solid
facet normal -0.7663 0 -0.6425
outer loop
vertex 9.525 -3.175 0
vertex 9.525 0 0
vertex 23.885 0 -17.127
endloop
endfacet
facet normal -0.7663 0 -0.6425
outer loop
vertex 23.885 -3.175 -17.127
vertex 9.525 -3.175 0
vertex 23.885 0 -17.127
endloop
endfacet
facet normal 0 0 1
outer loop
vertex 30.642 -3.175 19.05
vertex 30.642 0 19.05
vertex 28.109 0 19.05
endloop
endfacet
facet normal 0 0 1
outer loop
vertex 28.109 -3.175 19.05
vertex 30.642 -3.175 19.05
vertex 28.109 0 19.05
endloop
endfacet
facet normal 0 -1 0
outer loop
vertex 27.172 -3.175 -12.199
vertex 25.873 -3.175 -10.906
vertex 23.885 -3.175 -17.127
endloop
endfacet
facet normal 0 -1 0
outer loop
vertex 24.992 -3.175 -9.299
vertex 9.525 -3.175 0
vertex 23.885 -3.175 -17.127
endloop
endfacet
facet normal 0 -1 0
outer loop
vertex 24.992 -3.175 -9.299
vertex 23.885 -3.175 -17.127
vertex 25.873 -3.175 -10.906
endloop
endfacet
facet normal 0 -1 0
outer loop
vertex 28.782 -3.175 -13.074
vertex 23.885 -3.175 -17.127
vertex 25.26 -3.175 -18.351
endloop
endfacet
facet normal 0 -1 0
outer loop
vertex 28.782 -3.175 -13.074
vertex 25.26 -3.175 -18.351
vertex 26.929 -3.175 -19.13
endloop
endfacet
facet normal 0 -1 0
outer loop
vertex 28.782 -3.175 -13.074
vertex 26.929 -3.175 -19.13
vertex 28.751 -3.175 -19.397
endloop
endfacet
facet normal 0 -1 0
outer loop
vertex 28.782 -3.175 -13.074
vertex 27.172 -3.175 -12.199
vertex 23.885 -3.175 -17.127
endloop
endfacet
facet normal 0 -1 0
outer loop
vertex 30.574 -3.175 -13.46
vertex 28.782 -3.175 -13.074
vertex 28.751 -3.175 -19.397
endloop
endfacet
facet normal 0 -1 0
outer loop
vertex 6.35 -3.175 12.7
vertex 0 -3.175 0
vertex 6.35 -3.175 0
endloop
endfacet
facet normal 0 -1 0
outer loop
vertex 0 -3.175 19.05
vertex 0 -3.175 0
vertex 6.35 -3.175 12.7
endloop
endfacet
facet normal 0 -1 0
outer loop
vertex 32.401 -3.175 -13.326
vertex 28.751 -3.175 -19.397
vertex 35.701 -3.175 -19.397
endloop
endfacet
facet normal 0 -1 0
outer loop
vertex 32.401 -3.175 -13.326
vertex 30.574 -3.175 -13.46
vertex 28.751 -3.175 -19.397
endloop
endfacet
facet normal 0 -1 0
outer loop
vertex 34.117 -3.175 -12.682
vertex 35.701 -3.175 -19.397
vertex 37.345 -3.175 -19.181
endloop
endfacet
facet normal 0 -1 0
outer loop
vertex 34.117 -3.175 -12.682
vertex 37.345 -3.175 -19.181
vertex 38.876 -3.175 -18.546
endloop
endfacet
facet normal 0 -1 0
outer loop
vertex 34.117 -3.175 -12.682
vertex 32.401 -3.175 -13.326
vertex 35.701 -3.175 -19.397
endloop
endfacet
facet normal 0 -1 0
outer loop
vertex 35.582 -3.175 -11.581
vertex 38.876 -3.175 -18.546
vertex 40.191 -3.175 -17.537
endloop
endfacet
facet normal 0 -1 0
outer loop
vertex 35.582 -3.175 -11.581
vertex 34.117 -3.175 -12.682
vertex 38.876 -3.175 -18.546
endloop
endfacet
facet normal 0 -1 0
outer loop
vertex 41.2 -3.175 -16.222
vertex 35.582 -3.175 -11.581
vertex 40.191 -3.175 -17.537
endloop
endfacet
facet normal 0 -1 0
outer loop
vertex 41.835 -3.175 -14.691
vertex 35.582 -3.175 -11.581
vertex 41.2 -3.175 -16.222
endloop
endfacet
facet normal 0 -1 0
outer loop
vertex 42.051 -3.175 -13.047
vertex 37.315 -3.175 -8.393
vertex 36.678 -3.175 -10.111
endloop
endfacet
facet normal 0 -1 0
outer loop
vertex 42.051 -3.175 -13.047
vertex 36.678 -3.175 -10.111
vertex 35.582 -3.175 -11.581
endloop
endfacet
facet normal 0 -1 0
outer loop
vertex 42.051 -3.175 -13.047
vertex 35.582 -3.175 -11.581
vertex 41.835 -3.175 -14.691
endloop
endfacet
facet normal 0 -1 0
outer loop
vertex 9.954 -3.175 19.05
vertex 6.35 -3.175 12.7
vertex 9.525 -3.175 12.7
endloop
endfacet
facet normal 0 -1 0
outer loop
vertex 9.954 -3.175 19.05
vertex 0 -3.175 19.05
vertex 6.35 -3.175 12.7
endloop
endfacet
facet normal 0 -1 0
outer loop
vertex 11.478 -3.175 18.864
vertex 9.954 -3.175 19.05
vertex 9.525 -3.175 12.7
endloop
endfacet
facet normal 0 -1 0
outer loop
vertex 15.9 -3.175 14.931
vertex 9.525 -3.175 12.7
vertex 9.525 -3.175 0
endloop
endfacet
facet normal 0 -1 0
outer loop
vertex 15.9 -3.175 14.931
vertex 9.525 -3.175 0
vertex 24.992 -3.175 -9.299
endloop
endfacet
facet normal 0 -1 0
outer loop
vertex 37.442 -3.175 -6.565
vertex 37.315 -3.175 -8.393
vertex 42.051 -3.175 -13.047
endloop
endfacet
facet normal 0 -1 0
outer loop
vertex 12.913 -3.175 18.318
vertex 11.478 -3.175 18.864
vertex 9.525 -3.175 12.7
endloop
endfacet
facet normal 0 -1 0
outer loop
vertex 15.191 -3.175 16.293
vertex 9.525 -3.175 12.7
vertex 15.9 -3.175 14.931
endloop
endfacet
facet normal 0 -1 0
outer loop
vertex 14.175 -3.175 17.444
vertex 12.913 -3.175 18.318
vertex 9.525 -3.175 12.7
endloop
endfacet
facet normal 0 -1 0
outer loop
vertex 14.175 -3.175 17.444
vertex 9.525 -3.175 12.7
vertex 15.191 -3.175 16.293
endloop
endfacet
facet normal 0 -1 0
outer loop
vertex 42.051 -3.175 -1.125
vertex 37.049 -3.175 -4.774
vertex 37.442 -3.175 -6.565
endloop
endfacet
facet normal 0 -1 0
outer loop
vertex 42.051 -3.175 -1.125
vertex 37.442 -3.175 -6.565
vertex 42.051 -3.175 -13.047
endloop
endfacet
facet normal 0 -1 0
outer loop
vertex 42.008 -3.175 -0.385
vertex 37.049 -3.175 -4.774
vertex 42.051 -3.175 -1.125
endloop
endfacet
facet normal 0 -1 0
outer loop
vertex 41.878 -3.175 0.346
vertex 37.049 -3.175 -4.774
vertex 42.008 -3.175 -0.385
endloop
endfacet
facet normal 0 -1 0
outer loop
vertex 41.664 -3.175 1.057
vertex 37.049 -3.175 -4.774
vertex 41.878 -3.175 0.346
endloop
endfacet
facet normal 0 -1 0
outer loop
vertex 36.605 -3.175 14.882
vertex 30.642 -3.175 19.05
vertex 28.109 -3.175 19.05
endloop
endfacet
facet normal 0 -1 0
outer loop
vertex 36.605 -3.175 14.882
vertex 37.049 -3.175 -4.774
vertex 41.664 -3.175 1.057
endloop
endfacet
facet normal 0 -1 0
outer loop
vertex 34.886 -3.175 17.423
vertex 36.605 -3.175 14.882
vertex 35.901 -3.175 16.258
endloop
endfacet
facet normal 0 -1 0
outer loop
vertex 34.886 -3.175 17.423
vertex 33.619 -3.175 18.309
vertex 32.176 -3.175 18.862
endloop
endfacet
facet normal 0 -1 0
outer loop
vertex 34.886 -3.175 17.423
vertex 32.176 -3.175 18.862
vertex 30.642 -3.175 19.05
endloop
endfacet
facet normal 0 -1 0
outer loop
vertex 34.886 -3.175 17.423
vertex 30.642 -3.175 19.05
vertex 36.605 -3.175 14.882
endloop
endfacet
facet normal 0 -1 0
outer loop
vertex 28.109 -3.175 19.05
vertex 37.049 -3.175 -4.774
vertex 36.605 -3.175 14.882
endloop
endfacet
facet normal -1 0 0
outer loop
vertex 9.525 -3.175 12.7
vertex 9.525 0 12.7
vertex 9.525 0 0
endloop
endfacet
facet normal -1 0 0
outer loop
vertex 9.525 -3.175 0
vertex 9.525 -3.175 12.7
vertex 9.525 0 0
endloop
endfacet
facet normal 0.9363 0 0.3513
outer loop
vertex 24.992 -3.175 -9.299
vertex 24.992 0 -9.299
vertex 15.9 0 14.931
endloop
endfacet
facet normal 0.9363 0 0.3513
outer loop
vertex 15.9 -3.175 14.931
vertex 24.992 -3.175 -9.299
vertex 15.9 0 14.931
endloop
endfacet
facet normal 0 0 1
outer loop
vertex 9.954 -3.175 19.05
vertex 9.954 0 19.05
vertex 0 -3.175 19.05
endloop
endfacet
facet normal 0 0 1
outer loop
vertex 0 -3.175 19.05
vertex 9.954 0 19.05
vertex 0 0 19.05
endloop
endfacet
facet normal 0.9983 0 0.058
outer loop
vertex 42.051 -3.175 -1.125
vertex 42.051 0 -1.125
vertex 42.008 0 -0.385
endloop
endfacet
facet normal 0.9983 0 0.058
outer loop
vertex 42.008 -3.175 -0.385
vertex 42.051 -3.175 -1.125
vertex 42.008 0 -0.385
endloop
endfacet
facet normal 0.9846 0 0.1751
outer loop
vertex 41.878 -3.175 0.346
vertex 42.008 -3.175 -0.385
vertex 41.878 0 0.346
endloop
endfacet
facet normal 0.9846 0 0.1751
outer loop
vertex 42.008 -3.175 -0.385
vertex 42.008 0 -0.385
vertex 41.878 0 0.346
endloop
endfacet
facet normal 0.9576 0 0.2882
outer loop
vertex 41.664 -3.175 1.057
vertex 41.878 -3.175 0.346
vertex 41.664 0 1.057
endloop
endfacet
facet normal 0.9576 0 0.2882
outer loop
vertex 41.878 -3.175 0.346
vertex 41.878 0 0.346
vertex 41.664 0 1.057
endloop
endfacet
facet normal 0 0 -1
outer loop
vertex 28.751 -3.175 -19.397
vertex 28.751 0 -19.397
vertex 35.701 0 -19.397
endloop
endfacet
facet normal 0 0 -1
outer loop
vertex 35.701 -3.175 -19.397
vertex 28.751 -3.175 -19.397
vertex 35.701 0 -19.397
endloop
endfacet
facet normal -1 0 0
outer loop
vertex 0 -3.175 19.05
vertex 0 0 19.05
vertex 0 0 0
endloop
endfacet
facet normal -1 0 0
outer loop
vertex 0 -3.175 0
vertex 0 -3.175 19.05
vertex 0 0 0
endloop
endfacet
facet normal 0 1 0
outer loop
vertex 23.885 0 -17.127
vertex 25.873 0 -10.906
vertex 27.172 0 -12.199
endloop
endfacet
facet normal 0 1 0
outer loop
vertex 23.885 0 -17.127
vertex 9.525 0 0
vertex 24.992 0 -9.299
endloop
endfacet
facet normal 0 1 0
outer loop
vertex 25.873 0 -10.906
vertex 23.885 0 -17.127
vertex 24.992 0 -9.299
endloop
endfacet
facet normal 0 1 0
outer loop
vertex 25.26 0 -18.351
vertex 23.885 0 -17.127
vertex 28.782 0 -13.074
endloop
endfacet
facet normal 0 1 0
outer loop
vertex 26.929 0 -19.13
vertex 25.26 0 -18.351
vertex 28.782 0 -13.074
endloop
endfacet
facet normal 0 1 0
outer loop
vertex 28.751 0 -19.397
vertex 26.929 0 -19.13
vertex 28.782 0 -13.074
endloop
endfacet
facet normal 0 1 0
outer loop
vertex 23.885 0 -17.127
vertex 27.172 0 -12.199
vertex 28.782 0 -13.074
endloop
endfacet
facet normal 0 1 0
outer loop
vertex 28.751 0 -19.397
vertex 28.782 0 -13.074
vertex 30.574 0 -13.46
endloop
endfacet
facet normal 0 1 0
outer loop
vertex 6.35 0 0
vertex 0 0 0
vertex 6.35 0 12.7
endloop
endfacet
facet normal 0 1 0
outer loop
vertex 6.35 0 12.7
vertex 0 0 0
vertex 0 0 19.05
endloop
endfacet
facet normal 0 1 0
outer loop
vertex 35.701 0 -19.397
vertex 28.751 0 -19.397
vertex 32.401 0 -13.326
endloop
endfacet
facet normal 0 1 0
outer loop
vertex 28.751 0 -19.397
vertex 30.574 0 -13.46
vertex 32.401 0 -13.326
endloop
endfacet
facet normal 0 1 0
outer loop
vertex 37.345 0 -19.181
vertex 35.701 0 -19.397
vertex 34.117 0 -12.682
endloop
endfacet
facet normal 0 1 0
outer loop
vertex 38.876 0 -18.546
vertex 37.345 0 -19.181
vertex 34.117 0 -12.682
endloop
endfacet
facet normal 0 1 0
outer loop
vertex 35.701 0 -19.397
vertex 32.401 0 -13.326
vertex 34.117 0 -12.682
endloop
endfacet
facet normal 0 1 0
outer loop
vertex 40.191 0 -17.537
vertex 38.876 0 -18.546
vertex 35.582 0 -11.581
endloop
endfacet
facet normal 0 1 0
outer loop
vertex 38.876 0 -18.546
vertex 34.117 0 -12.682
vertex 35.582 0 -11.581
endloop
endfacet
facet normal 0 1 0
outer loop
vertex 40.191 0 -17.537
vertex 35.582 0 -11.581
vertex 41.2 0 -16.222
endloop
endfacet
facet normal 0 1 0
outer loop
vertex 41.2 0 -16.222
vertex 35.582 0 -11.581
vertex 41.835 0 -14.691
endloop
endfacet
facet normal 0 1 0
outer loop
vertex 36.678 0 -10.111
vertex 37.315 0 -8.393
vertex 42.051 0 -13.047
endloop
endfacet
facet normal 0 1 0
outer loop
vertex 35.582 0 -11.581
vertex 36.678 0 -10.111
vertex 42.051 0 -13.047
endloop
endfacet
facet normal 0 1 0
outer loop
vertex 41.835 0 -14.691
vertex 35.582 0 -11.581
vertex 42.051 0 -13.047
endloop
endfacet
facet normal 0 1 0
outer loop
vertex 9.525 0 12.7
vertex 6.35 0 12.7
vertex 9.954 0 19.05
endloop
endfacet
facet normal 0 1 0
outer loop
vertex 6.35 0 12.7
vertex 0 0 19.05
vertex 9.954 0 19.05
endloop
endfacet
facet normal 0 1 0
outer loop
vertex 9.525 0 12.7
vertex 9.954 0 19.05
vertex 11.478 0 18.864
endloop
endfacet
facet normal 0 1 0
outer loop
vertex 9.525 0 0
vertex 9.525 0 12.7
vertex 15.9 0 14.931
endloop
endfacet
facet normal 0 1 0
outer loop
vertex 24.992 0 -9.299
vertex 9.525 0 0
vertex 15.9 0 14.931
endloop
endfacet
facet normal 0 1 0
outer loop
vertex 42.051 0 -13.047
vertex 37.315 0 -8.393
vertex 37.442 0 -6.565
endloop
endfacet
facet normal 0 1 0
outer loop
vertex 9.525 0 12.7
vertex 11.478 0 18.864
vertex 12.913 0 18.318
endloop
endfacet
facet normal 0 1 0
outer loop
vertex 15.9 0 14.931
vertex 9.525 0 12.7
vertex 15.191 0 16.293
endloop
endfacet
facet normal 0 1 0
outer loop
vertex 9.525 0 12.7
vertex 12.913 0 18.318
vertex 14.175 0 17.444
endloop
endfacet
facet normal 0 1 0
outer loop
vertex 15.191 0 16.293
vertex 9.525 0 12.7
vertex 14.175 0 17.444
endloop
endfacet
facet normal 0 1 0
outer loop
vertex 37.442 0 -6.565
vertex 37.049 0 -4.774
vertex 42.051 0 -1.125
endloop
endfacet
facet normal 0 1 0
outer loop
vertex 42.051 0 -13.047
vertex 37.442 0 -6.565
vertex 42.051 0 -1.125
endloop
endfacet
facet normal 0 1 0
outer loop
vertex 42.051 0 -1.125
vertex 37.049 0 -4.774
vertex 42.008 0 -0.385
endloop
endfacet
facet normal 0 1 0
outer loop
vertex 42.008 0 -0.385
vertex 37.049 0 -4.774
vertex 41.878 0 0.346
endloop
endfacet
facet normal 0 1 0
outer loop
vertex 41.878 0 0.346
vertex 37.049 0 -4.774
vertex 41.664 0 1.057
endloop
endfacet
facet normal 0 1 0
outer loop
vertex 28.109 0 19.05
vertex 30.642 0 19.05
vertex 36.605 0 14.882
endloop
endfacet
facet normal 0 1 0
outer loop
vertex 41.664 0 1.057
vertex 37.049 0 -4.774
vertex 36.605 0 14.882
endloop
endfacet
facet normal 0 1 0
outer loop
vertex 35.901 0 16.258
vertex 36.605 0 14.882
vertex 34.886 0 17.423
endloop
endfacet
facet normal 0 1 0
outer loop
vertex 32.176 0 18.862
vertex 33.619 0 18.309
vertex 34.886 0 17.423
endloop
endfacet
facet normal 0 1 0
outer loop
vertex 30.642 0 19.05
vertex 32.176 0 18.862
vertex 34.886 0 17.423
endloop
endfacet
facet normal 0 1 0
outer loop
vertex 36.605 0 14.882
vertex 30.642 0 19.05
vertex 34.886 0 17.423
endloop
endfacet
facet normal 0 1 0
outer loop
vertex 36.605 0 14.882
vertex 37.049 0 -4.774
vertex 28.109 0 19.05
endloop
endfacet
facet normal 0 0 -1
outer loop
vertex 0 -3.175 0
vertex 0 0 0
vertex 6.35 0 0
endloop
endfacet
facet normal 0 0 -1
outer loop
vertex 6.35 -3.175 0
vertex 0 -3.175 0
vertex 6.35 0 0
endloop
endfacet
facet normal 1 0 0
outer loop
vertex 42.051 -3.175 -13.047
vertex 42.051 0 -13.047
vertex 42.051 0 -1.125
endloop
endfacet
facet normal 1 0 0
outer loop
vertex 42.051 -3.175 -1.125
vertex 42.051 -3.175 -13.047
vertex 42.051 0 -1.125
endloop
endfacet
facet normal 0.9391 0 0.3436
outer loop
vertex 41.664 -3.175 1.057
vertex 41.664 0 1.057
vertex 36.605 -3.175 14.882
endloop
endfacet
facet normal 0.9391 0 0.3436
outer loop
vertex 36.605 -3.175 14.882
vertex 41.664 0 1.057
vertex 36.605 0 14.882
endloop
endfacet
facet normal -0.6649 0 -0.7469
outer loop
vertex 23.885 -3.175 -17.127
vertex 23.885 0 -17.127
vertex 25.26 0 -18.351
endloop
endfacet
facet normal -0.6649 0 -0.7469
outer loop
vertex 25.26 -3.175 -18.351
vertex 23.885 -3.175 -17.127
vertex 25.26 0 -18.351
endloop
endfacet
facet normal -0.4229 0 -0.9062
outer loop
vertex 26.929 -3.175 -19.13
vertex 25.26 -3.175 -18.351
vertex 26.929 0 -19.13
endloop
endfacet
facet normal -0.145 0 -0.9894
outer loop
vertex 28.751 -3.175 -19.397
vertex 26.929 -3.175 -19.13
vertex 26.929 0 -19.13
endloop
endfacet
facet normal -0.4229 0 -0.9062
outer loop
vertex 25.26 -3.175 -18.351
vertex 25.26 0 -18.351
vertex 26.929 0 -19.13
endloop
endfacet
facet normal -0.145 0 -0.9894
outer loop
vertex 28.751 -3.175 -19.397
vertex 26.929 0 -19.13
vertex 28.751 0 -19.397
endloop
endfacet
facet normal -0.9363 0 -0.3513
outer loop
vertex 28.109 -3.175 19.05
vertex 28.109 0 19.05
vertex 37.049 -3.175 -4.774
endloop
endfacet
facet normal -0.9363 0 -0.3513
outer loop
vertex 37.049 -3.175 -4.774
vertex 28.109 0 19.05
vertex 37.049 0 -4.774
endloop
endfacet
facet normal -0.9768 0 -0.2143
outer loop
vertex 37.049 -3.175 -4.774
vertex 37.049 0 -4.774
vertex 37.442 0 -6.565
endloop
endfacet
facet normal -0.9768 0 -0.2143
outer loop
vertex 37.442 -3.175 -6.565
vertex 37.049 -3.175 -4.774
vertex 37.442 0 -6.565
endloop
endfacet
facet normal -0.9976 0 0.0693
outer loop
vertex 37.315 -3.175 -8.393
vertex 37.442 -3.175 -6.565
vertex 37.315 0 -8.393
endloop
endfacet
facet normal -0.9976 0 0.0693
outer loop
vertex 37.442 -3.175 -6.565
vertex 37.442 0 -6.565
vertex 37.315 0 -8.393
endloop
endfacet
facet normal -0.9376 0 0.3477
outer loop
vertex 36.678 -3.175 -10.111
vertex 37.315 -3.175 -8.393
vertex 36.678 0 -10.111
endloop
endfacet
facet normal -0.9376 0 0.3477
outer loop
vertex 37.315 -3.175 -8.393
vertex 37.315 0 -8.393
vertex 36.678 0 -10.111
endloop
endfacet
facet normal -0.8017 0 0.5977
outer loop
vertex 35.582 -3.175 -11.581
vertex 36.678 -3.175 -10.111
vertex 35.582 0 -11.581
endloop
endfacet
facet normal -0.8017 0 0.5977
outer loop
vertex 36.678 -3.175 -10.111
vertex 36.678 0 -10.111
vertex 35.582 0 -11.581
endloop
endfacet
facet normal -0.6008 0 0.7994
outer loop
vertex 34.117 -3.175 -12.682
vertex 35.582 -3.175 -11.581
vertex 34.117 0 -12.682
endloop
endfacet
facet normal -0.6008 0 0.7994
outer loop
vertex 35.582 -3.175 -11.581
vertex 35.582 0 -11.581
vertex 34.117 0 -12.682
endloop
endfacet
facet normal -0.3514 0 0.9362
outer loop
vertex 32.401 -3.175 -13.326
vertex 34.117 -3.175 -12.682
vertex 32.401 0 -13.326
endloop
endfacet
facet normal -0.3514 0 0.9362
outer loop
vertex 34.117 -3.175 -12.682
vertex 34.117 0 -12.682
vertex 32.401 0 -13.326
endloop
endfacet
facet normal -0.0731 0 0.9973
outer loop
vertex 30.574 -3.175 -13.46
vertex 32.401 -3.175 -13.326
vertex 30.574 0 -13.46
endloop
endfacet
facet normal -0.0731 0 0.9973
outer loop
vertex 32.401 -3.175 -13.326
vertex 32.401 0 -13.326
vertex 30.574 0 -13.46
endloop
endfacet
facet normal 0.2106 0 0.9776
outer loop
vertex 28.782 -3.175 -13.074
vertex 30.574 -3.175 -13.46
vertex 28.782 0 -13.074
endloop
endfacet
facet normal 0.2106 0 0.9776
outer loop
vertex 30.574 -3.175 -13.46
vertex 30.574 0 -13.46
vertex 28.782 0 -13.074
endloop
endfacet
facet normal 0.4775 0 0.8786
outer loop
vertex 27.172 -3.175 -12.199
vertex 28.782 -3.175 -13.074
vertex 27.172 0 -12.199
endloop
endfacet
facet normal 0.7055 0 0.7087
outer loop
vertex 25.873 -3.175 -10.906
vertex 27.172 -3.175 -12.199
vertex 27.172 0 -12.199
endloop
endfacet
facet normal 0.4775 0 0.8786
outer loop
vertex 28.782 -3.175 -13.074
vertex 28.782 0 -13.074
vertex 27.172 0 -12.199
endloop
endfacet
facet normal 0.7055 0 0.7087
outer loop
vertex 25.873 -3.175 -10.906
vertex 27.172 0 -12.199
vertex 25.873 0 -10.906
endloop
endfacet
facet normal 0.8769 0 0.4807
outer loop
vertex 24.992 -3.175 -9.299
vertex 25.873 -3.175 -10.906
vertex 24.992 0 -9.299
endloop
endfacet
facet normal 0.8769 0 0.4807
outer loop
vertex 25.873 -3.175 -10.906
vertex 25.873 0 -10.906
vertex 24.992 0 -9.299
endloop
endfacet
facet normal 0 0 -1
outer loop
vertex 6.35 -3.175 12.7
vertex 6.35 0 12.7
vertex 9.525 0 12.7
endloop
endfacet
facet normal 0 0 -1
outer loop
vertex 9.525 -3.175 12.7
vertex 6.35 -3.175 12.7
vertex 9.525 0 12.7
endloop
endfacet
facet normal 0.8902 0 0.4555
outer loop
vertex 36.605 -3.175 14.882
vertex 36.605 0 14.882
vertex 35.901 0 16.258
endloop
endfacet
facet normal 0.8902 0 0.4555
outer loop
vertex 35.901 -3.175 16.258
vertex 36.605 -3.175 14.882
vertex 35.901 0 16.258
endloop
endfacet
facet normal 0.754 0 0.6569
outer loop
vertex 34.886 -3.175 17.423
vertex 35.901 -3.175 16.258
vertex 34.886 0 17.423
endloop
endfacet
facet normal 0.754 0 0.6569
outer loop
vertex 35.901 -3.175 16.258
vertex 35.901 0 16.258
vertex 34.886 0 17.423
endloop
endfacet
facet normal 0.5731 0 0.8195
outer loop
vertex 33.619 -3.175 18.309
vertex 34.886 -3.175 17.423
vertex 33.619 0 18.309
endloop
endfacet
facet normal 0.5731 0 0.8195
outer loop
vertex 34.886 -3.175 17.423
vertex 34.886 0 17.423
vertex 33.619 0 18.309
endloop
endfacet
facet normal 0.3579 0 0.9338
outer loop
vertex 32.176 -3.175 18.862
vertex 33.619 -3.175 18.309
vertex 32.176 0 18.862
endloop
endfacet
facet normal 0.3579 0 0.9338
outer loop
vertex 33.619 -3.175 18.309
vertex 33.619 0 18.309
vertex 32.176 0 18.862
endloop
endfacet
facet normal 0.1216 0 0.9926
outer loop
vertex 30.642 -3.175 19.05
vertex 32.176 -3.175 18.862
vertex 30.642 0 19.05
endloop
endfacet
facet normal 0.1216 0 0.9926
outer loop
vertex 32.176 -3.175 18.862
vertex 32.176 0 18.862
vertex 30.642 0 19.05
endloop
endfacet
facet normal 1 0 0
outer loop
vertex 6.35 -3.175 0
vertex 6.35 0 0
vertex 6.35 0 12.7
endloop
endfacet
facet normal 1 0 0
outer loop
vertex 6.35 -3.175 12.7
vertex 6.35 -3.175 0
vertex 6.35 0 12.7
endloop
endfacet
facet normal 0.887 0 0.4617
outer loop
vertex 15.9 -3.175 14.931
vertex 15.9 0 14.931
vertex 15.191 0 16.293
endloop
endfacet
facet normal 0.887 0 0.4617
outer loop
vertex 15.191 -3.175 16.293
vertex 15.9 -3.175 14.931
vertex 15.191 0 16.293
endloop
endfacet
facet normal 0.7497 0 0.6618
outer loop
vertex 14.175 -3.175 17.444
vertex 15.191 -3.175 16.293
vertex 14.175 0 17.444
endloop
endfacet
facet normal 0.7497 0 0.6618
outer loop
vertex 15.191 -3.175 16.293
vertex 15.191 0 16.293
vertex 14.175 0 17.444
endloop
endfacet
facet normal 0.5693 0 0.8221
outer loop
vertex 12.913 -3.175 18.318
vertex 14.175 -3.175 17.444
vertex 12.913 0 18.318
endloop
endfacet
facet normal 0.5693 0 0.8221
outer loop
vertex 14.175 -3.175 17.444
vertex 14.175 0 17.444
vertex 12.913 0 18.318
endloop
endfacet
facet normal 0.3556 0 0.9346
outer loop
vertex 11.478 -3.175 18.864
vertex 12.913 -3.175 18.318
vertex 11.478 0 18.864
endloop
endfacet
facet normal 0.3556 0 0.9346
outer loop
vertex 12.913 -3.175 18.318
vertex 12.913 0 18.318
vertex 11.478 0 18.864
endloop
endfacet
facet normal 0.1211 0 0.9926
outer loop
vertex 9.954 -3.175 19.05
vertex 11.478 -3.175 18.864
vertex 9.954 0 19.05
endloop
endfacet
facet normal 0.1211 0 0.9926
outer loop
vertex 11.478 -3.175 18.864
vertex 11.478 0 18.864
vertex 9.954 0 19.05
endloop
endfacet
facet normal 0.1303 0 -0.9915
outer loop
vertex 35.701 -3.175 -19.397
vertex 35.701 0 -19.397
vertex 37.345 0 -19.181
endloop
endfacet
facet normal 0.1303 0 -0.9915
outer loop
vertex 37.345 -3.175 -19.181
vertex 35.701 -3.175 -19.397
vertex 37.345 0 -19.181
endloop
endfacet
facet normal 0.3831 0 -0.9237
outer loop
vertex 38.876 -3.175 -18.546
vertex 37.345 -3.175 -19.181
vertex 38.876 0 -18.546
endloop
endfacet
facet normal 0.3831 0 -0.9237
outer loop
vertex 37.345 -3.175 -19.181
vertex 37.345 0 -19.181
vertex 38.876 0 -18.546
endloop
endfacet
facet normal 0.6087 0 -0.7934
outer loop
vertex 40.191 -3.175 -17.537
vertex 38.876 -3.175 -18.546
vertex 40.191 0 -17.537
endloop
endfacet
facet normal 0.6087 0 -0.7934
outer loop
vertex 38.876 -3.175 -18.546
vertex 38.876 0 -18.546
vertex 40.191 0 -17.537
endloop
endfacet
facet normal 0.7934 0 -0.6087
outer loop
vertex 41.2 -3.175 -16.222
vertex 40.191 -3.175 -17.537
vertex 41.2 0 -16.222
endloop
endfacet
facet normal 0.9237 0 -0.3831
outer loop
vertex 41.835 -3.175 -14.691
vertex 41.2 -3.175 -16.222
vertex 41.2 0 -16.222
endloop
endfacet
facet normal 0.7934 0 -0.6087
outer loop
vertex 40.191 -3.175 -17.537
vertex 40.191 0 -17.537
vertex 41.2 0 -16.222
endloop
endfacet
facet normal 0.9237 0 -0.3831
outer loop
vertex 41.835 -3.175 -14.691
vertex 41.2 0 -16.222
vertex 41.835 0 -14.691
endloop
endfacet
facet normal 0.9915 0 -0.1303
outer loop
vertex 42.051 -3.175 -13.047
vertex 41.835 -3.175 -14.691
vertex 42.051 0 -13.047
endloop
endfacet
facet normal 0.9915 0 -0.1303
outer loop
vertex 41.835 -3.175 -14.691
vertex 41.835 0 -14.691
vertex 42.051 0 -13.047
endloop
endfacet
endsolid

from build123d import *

# Parameters (mm, degrees)
F1_DEPTH = 3.175


# Not quite as in the source:
# - a length typed as a fraction of an inch, garbled in the dataset ("3 / 203.2 mm" for 3/8 in), is restored


with BuildPart() as f1:
    # F0 (on Front) → F1 (new body)
    with BuildSketch(Plane.XZ):
        with BuildLine():
            Line((0, 19.05), (0, 0))
            Line((0, 0), (6.35, 0))
            Line((6.35, 0), (6.35, 12.7))
            Line((6.35, 12.7), (9.525, 12.7))
            Line((9.525, 12.7), (9.525, 0))
            Line((9.525, 0), (23.8846407704, -17.1268223527))
            ThreePointArc((23.8846407704, -17.1268223527), (26.0658700781, -18.8015604613), (28.7506271903, -19.3970336129))
            Line((28.7506271903, -19.3970336129), (35.7011077573, -19.3970336129))
            ThreePointArc((35.7011077573, -19.3970336129), (40.1912358178, -17.5371616734), (42.0511077573, -13.0470336129))
            Line((42.0511077573, -13.0470336129), (42.0511077573, -1.1253461624))
            ThreePointArc((42.0511077573, -1.1253461624), (41.9536799226, -0.017266148), (41.6643860823, 1.0568113981))
            Line((41.6643860823, 1.0568113981), (36.6052420996, 14.8821575605))
            ThreePointArc((36.6052420996, 14.8821575605), (34.2796690603, 17.9047670702), (30.6419637747, 19.05))
            Line((30.6419637747, 19.05), (28.1090781347, 19.05))
            Line((28.1090781347, 19.05), (37.0488404527, -4.7744145618))
            ThreePointArc((37.0488404527, -4.7744145618), (33.2823465228, -13.0652413354), (24.9915197492, -9.2987474054))
            Line((24.9915197492, -9.2987474054), (15.8997145825, 14.9308604634))
            ThreePointArc((15.8997145825, 14.9308604634), (13.5708732383, 17.9196007483), (9.9544844278, 19.05))
            Line((9.9544844278, 19.05), (0, 19.05))
        make_face()
    extrude(amount=F1_DEPTH)


solid = f1.part
